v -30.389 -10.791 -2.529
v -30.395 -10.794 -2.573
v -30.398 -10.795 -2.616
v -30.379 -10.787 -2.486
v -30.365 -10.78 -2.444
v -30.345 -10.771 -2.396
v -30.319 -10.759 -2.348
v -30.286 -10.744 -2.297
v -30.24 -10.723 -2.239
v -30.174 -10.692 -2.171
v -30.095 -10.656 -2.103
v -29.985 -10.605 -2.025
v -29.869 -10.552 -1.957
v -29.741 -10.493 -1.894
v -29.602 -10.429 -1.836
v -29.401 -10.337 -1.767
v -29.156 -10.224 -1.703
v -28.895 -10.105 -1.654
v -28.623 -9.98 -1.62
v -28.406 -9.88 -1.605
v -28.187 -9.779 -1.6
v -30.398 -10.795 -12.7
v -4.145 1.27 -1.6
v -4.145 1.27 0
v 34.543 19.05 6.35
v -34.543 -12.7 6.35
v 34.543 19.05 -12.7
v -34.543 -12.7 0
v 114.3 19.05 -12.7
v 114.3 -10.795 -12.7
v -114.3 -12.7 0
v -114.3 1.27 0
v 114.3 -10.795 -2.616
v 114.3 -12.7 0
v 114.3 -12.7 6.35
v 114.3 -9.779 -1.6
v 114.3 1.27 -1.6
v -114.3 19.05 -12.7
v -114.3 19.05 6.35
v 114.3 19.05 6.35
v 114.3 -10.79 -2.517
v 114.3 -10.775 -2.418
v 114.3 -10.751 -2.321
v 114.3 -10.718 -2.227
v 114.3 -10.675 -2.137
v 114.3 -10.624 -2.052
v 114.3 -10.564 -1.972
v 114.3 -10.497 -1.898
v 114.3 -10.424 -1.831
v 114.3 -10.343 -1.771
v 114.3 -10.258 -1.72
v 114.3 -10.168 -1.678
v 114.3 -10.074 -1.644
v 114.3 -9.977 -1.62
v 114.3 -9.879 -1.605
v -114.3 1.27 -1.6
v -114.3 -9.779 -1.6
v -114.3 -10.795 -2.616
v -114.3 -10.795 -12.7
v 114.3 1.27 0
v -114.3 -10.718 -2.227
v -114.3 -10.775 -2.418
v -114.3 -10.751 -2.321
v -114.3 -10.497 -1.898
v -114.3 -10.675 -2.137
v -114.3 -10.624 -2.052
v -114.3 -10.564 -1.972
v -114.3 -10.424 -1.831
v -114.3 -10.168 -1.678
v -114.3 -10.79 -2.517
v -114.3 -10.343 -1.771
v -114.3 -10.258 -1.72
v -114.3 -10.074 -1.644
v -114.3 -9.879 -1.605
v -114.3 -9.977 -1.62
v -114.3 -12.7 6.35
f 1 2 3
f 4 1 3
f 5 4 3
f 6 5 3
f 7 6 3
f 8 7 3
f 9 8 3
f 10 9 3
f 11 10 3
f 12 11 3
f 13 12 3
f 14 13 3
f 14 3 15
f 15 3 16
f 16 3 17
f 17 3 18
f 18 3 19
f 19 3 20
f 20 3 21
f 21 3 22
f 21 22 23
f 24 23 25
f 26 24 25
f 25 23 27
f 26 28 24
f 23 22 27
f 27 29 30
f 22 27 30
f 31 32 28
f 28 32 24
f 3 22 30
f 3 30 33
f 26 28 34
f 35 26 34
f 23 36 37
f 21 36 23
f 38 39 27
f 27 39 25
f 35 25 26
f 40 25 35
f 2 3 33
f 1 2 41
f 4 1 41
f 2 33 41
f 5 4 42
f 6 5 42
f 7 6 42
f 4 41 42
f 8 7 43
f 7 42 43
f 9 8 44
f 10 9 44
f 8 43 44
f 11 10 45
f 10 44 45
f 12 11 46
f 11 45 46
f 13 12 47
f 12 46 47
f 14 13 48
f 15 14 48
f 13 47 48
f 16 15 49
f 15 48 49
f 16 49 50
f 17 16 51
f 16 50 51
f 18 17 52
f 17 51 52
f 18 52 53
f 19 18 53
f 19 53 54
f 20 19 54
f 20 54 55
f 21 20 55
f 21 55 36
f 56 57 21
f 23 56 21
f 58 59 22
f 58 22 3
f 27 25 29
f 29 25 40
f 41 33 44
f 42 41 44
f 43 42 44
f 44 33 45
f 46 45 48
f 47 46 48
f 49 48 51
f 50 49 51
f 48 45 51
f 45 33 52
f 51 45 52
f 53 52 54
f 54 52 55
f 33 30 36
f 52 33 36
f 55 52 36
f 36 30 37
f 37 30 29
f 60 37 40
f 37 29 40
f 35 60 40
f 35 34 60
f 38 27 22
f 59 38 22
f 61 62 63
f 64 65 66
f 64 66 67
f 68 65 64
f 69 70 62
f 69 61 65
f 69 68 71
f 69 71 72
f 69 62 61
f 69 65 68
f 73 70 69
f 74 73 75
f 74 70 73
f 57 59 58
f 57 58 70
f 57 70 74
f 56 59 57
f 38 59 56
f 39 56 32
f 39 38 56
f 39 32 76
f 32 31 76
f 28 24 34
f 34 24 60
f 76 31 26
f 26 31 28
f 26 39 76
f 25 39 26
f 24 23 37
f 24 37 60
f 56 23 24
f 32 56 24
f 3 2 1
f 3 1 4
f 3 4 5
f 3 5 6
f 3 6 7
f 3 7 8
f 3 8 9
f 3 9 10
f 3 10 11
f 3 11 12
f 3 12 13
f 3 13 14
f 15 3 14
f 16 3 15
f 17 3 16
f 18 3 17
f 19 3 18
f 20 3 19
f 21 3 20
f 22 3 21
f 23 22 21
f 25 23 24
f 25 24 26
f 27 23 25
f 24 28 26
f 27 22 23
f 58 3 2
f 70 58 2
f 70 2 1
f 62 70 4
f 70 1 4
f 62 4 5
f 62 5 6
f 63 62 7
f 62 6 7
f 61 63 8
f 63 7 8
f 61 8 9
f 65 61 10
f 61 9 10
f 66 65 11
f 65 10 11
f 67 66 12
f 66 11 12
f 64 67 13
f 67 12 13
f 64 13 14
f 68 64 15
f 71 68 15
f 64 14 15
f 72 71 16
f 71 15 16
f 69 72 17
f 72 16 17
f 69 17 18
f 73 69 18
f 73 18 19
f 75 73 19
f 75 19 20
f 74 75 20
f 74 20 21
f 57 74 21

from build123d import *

# Parameters (mm, degrees)
SKETCH1_W              = 228.6
SKETCH1_H              = 25.4
SKETCH1_H_2            = 6.35
BOSS_EXTRUDE1_DEPTH    = 6.35
SKETCH1_3_W            = 228.6
SKETCH1_3_H            = 6.35
BOSS_EXTRUDE2_DEPTH    = 12.7
BOSS_EXTRUDE3_DEPTH    = 228.6
FILLET1_R              = 1.016
SPLIT2_SURFACE_1_BACK  = 232.579
SPLIT2_SURFACE_1_DEPTH = 465.158
SPLIT2_SURFACE_2_BACK  = 232.579
SPLIT2_SURFACE_2_DEPTH = 465.158


with BuildPart() as part:
    # Sketch1 → Boss-Extrude1 (new body)
    with BuildSketch(Plane.XY):
        Rectangle(SKETCH1_W, SKETCH1_H)
        with Locations((0, 15.875)):
            Rectangle(SKETCH1_W, SKETCH1_H_2)
    extrude(amount=BOSS_EXTRUDE1_DEPTH)

    # Sketch1<3> → Boss-Extrude2 (add)
    with BuildSketch(Plane.XY):
        with Locations((0, 15.875)):
            Rectangle(SKETCH1_3_W, SKETCH1_3_H)
    extrude(amount=-BOSS_EXTRUDE2_DEPTH)

    # Sketch4 → Boss-Extrude3 (add)
    with BuildSketch(Plane.ZY.offset(114.3)):
        Polygon((-12.7, 12.7), (-12.7, -10.795), (-1.6002, -10.795), (-1.6002, 1.27), (0, 1.27), (0, -12.7), (6.35, -12.7), (6.35, 19.05), (-12.7, 19.05), align=None)
    extrude(amount=-BOSS_EXTRUDE3_DEPTH)

    # Fillet1
    fillet1_edges = [part.edges().sort_by_distance(p)[0] for p in [
        (0, -10.795, -1.6002),
    ]]
    fillet(fillet1_edges, radius=FILLET1_R)


with BuildPart() as body_2:
    # Split2: the piece behind the surface
    add(part.part)
    # Split2 surface: a surface, the sketch's curves swept straight by 465.158 mm
    with BuildLine(Plane.XY.offset(6.35).offset(-SPLIT2_SURFACE_1_BACK), mode=Mode.PRIVATE) as split2_surface_1_path:
        Line((-34.542642552, -12.7), (34.542642552, 19.05))
    split2_surface_1 = Shell.extrude(split2_surface_1_path.wire(), (0 * SPLIT2_SURFACE_1_DEPTH, 0 * SPLIT2_SURFACE_1_DEPTH, 1 * SPLIT2_SURFACE_1_DEPTH))
    split(bisect_by=split2_surface_1, keep=Keep.BOTTOM)


with BuildPart() as part_1:
    add(part.part)

    # Split2: split by a surface, the side it looks to stays
    # Split2 surface: a surface, the sketch's curves swept straight by 465.158 mm
    with BuildLine(Plane.XY.offset(6.35).offset(-SPLIT2_SURFACE_2_BACK), mode=Mode.PRIVATE) as split2_surface_2_path:
        Line((-34.542642552, -12.7), (34.542642552, 19.05))
    split2_surface_2 = Shell.extrude(split2_surface_2_path.wire(), (0 * SPLIT2_SURFACE_2_DEPTH, 0 * SPLIT2_SURFACE_2_DEPTH, 1 * SPLIT2_SURFACE_2_DEPTH))
    split(bisect_by=split2_surface_2, keep=Keep.TOP)


solid = Compound([body_2.part, part_1.part])
